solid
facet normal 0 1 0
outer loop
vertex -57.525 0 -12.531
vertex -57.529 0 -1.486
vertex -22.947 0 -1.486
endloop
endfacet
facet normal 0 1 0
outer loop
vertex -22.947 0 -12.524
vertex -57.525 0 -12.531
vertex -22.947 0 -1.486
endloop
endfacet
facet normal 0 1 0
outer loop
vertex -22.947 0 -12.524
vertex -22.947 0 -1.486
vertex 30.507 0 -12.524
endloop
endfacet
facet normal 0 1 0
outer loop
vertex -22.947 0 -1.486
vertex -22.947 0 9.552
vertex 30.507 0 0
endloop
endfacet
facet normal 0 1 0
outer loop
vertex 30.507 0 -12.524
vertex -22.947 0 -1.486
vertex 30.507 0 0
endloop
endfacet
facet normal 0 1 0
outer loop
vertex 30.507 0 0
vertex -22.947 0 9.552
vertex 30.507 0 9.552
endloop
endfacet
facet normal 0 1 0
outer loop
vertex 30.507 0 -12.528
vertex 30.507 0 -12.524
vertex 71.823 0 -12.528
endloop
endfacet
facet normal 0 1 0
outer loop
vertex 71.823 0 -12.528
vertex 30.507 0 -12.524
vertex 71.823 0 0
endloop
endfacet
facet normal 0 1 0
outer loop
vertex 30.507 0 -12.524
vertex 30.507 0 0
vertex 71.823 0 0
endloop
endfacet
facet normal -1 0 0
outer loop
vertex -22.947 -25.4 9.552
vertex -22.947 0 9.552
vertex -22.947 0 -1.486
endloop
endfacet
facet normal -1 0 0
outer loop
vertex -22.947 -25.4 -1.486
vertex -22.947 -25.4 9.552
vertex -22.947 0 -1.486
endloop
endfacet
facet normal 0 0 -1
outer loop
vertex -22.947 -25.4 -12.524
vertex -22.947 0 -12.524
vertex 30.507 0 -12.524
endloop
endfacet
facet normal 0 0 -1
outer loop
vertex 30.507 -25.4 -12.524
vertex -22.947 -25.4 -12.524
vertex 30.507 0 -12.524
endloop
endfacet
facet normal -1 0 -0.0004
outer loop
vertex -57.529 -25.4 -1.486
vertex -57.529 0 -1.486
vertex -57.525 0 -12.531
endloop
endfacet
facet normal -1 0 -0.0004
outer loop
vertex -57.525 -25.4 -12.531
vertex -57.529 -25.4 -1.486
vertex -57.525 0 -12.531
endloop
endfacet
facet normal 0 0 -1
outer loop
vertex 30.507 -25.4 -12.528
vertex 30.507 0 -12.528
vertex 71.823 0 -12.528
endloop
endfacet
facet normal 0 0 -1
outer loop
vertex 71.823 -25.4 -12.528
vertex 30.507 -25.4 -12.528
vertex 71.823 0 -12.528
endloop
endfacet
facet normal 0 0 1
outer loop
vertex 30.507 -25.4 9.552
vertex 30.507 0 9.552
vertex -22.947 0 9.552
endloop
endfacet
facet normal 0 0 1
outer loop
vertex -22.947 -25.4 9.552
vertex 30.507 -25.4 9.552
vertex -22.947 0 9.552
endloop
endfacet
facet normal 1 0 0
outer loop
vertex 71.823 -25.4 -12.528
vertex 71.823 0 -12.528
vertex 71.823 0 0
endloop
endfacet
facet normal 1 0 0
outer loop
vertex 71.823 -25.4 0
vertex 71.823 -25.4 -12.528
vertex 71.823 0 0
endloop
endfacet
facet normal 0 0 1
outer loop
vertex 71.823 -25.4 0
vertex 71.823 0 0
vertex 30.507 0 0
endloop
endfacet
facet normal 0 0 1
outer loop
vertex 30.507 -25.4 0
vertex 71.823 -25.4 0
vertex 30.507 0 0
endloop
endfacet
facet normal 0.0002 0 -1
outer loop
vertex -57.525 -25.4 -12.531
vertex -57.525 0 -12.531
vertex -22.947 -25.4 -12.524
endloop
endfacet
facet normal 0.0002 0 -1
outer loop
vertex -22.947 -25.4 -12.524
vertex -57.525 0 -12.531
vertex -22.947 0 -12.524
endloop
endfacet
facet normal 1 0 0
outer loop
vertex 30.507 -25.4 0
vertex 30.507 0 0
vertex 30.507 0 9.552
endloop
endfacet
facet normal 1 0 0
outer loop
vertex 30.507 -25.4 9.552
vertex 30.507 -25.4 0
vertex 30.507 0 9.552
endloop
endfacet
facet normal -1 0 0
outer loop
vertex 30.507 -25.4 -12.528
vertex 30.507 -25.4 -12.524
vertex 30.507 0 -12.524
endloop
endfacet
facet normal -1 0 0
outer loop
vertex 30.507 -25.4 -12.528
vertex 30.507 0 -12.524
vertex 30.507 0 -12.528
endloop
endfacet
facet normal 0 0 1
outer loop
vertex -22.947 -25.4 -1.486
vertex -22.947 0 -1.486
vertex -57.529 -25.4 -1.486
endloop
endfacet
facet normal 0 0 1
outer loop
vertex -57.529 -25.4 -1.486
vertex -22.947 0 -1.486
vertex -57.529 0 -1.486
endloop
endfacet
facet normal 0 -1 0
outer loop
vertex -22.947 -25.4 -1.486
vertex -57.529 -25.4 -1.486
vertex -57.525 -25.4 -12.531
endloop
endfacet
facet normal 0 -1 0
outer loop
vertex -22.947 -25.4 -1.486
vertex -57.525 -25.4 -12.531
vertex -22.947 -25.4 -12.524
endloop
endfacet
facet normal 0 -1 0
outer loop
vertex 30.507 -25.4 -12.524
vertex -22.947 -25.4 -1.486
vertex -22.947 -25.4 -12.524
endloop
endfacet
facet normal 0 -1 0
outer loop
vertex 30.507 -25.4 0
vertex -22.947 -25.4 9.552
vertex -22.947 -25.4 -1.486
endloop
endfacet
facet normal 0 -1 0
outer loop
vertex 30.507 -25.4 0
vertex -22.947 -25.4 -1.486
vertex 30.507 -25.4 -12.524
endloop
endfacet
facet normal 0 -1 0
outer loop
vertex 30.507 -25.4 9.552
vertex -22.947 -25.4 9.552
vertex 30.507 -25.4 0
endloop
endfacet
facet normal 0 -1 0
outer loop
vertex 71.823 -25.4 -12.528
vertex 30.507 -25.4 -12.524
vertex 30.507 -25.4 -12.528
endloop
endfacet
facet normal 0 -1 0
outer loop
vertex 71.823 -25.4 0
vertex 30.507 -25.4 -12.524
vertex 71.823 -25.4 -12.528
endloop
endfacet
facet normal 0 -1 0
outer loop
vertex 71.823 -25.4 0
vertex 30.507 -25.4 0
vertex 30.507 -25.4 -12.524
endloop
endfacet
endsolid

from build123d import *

# Parameters (mm, degrees)
F1_DEPTH = 25.4


with BuildPart() as f1:
    # F0 (on Front) → F1 (new body)
    with BuildSketch(Plane.XZ):
        Polygon((-22.947412, -12.524042), (-22.947412, -1.48623), (-57.528757, -1.48623), (-57.525477, -12.531252), align=None)
        Polygon((71.822926, 0), (30.506756, 0), (30.506756, -12.524042), (30.506756, -12.528093), (71.822926, -12.528093), align=None)
        Polygon((30.506756, 9.551582), (-22.947412, 9.551582), (-22.947412, -1.48623), (-22.947412, -12.524042), (30.506756, -12.524042), (30.506756, 0), align=None)
    extrude(amount=F1_DEPTH)


solid = f1.part
